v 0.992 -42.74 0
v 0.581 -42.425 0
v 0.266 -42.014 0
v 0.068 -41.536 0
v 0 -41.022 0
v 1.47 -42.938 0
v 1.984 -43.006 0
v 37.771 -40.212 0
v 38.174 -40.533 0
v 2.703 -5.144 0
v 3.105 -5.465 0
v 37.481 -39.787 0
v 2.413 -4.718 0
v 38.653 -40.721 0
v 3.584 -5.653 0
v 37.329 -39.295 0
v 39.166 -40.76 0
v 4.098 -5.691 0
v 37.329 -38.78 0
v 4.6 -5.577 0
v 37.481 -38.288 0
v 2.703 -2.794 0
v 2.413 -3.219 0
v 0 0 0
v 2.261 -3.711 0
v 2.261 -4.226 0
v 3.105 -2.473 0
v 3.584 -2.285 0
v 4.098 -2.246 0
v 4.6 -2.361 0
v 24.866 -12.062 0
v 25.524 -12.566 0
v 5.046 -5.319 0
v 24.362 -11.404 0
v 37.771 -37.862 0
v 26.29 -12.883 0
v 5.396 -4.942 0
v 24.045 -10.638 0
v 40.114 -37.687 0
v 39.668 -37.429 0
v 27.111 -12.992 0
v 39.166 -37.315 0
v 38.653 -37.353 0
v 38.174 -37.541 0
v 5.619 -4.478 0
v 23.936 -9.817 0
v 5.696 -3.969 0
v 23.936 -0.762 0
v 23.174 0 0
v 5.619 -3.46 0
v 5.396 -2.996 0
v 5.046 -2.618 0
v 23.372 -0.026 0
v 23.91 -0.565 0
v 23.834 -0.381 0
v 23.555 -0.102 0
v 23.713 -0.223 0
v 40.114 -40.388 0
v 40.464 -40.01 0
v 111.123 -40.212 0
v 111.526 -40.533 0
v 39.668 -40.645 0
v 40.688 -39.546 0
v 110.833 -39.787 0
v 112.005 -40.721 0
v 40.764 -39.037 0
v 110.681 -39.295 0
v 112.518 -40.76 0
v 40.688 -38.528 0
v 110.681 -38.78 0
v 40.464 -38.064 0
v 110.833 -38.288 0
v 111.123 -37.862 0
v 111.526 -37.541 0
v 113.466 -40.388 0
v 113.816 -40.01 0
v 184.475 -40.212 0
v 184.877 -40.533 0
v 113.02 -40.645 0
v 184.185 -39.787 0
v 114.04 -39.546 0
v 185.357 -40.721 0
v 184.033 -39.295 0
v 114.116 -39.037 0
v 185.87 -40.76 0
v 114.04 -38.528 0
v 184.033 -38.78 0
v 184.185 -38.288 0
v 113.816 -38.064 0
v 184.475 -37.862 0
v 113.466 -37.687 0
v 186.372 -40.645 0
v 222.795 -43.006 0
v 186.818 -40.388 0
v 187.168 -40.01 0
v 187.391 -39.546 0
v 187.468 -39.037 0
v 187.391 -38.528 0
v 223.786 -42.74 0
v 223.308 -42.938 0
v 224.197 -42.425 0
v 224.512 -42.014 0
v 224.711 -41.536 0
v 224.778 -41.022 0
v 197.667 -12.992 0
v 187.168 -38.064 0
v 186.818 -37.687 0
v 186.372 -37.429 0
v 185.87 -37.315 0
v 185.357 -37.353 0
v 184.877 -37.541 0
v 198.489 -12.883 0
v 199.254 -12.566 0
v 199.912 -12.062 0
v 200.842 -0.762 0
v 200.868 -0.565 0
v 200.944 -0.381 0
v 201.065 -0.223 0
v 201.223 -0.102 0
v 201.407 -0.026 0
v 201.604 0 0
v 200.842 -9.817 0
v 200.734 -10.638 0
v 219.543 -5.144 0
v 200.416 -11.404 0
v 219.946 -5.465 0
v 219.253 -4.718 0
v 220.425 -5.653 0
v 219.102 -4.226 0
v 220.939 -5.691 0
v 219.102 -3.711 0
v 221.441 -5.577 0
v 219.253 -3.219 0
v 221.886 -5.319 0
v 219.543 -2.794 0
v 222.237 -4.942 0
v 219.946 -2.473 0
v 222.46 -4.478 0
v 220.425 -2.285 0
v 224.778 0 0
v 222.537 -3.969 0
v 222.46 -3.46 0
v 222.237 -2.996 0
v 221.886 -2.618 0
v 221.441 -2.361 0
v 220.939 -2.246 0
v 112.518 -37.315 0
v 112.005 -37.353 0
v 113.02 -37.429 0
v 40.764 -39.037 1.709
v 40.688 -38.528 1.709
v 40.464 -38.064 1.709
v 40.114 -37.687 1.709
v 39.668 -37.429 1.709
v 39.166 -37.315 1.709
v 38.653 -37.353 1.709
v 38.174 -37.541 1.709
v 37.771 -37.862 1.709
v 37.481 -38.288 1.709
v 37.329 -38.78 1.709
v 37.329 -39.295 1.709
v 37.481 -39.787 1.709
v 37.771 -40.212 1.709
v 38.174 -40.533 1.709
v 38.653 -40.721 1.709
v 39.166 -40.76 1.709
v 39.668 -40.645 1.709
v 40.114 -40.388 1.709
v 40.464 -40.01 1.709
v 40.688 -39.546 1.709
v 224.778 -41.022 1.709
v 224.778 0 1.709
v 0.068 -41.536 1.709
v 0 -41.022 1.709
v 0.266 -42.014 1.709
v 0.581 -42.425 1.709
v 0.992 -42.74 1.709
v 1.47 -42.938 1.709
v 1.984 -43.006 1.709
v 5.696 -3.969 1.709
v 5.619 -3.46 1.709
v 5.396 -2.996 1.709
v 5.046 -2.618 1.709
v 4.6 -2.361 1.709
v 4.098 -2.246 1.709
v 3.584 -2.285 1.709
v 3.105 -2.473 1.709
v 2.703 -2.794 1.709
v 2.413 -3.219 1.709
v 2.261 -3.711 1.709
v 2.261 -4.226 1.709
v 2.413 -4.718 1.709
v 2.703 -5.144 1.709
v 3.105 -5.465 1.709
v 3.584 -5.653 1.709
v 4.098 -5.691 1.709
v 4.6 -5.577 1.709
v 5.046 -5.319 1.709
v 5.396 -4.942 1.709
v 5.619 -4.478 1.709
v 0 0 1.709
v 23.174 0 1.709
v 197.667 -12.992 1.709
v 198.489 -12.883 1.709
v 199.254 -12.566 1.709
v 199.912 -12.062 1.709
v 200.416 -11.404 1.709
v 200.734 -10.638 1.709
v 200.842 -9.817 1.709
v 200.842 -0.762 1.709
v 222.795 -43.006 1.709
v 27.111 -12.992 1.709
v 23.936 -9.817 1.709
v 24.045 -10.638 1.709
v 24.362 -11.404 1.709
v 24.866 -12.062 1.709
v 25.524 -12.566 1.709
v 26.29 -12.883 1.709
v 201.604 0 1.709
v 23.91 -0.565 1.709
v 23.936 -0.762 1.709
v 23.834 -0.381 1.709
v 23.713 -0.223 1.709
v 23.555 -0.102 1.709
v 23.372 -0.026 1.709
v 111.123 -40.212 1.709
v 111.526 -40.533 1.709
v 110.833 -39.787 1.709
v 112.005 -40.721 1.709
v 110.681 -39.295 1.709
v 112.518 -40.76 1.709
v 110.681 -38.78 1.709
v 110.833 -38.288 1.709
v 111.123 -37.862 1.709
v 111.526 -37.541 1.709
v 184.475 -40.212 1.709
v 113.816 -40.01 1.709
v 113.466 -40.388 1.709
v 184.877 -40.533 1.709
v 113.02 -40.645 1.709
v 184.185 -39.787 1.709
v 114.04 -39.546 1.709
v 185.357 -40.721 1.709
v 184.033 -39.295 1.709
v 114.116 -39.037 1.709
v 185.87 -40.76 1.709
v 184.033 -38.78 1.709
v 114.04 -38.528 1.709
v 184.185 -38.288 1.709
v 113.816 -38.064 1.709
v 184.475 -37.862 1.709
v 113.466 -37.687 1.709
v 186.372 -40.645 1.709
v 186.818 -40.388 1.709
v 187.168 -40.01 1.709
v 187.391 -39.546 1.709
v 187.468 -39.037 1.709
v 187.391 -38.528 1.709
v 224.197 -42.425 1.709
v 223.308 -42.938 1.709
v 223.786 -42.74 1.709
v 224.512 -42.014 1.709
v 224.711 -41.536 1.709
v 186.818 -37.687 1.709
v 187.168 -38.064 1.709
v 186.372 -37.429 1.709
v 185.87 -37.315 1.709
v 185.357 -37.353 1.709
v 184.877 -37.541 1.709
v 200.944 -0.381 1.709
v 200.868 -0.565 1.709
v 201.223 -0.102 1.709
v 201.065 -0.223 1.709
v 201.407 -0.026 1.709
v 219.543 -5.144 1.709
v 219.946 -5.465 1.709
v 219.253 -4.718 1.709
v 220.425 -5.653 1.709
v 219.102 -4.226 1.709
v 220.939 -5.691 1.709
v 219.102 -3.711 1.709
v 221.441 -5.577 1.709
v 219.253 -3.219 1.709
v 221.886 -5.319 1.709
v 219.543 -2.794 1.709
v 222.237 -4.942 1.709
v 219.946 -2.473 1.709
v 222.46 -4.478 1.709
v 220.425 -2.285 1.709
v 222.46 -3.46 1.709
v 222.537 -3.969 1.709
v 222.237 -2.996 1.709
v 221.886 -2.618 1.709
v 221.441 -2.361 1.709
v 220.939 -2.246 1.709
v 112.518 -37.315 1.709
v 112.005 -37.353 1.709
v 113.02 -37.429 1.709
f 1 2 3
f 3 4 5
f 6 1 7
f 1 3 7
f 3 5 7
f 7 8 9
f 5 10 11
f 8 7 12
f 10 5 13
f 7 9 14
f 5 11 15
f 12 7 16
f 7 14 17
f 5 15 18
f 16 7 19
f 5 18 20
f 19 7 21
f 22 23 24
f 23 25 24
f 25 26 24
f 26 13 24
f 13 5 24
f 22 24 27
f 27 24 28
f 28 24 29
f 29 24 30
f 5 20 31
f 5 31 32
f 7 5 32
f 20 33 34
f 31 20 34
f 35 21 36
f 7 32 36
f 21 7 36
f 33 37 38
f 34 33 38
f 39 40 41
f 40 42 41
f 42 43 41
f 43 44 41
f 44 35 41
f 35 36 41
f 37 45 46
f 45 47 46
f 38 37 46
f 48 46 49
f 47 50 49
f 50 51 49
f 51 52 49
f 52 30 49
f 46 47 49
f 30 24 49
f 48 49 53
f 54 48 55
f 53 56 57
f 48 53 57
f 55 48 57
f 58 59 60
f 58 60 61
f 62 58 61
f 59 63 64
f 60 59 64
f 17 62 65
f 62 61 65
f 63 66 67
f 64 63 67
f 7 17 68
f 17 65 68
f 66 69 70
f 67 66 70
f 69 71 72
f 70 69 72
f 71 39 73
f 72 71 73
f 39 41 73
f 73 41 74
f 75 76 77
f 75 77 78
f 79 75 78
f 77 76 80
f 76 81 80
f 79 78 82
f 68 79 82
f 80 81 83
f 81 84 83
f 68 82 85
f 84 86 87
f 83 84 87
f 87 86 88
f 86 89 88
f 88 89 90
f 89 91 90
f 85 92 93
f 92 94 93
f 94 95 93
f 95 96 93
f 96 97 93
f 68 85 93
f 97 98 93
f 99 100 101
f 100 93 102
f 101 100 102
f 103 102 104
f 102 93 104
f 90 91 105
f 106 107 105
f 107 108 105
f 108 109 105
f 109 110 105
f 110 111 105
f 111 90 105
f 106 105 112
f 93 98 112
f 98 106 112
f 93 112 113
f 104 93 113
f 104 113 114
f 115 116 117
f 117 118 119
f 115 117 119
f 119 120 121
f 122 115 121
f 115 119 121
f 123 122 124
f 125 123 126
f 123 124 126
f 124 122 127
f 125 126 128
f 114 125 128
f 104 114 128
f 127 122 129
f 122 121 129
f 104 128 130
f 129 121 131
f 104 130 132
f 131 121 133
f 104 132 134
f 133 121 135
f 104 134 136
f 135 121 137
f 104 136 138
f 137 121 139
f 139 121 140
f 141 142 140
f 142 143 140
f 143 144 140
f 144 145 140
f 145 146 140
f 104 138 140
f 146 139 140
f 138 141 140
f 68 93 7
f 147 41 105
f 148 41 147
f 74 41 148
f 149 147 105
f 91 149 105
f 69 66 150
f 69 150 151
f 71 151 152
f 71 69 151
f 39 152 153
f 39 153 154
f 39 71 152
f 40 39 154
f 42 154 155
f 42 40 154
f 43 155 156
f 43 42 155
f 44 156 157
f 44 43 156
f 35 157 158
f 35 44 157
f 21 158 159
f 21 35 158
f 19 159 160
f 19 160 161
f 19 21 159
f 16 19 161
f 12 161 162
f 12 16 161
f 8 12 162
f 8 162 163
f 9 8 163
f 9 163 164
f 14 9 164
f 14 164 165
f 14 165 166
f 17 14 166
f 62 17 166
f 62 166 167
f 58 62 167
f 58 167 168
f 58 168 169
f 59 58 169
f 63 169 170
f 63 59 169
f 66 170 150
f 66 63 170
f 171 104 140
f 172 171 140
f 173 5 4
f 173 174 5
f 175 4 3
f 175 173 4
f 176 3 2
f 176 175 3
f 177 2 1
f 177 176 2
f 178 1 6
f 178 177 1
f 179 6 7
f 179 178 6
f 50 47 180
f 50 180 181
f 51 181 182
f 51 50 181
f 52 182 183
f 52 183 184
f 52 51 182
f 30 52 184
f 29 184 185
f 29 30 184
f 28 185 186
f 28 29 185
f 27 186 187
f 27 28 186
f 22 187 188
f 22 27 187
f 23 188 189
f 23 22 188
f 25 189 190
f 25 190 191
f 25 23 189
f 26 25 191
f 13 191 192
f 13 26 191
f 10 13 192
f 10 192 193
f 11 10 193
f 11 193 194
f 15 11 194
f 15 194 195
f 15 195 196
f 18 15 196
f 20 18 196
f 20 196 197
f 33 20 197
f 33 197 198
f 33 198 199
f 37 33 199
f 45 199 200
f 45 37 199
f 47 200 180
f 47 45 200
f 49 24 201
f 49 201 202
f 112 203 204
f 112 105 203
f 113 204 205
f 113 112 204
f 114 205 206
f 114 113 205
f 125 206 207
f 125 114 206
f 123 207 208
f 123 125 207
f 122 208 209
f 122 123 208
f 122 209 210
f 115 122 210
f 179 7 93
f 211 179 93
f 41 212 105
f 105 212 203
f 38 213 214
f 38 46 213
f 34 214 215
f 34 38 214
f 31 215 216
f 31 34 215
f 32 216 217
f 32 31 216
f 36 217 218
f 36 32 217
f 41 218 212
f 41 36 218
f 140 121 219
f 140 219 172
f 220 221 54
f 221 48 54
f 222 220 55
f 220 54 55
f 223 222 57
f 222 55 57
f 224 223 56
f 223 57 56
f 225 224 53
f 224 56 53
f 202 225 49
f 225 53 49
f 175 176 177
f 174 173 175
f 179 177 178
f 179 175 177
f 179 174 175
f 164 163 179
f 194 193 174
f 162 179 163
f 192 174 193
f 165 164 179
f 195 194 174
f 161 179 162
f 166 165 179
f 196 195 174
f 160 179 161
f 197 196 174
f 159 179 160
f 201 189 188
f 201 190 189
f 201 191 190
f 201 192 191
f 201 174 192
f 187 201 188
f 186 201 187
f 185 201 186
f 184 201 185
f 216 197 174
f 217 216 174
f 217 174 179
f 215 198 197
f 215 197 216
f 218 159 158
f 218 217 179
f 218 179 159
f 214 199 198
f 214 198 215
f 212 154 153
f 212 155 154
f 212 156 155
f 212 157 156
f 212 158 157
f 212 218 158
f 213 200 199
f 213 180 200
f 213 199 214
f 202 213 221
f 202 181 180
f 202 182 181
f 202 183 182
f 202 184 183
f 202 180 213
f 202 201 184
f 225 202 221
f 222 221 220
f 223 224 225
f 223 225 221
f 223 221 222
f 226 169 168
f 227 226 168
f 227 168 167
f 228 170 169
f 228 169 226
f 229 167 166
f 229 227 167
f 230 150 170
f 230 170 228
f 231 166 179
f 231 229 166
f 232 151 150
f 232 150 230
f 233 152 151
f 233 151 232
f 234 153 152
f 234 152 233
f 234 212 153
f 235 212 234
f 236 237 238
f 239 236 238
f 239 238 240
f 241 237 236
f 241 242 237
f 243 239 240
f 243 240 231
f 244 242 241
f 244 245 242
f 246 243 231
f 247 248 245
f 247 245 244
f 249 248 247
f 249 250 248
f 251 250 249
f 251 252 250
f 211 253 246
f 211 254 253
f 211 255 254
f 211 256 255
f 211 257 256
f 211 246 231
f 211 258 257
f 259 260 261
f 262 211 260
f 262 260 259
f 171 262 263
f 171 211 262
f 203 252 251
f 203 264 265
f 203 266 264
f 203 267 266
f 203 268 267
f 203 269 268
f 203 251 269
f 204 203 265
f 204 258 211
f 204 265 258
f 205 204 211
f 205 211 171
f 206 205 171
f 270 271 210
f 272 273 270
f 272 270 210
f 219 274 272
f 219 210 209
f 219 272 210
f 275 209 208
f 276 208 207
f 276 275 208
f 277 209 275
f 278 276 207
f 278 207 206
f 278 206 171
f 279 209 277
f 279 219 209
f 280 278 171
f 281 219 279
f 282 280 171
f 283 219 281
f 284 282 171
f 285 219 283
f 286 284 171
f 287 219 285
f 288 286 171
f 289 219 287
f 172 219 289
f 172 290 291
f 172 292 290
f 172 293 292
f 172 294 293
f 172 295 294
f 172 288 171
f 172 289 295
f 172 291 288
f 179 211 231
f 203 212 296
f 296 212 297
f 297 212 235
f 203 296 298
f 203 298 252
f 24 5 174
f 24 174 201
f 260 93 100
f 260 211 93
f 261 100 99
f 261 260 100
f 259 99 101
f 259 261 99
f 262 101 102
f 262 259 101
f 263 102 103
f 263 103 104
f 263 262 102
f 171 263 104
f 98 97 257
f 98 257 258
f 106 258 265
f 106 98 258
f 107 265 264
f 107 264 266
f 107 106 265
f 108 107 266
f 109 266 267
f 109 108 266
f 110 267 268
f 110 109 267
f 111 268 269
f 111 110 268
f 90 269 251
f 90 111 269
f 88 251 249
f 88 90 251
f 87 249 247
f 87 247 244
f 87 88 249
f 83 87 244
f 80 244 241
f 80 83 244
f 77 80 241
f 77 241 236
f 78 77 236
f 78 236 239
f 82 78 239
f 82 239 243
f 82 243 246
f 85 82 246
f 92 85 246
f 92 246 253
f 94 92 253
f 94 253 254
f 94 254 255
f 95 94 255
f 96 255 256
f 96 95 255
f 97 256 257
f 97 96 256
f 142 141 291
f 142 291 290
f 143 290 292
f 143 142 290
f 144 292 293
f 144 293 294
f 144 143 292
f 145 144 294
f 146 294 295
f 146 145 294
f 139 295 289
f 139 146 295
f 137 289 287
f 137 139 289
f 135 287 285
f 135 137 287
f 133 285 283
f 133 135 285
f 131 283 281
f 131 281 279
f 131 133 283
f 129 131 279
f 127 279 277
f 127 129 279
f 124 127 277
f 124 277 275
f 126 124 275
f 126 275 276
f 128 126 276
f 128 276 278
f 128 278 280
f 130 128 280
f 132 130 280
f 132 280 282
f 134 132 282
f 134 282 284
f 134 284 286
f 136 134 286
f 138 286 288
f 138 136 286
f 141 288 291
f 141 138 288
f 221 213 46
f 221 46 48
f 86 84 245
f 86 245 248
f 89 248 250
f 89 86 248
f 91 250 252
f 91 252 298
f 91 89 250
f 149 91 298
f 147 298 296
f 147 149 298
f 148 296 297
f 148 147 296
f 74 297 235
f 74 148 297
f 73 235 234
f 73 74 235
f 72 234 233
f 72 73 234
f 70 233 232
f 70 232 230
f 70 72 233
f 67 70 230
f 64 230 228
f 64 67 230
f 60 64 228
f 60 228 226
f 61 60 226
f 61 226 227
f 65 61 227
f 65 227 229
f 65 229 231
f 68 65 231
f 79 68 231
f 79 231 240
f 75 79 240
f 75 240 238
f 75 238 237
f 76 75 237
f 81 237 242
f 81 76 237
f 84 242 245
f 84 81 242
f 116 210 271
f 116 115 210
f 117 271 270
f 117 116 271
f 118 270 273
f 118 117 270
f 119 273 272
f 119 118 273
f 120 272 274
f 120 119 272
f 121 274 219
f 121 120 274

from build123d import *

# Parameters (mm, degrees)
F0_W     = 224.7782652
F0_H     = 43.0059846
F0_R     = 1.7272
F1_DEPTH = 1.70942
F2_R     = 1.98374
F3_W     = 176.9053931614
F3_H     = 12.9915969446
F4_DEPTH = 1.70942
F5_R     = 3.175
F6_R     = 0.762


with BuildPart() as f1:
    # F0 (on Top) → F1 (new body)
    with BuildSketch(Plane.XY):
        with Locations((112.3891326, -21.5029923)):
            Rectangle(F0_W, F0_H)
        with Locations((39.0372346, -39.0372346)):
            Circle(F0_R, mode=Mode.SUBTRACT)
        with Locations((112.3891326, -39.0372346)):
            Circle(F0_R, mode=Mode.SUBTRACT)
        with Locations((185.7410306, -39.0372346)):
            Circle(F0_R, mode=Mode.SUBTRACT)
        with Locations((3.96875, -3.96875)):
            Circle(F0_R, mode=Mode.SUBTRACT)
        with Locations((220.8095152, -3.96875)):
            Circle(F0_R, mode=Mode.SUBTRACT)
    extrude(amount=F1_DEPTH)

    # F2
    f2_edges = [f1.edges().sort_by_distance(p)[0] for p in [
        (0, -43.005985, 0.85471),
        (224.778265, -43.005985, 0.85471),
    ]]
    fillet(f2_edges, radius=F2_R)

    # F3 (on face) → F4 (cut, through all)
    with BuildSketch(Plane.XY.offset(1.70942)):
        with Locations((112.3891326, -6.4957984723)):
            Rectangle(F3_W, F3_H)
    extrude(amount=-F4_DEPTH, mode=Mode.SUBTRACT)

    # F5
    f5_edges = [f1.edges().sort_by_distance(p)[0] for p in [
        (200.841829, -12.991597, 0.85471),
        (23.936436, -12.991597, 0.85471),
    ]]
    fillet(f5_edges, radius=F5_R)

    # F6
    f6_edges = [f1.edges().sort_by_distance(p)[0] for p in [
        (23.936436, 0, 0.85471),
        (200.841829, 0, 0.85471),
    ]]
    fillet(f6_edges, radius=F6_R)


solid = f1.part
